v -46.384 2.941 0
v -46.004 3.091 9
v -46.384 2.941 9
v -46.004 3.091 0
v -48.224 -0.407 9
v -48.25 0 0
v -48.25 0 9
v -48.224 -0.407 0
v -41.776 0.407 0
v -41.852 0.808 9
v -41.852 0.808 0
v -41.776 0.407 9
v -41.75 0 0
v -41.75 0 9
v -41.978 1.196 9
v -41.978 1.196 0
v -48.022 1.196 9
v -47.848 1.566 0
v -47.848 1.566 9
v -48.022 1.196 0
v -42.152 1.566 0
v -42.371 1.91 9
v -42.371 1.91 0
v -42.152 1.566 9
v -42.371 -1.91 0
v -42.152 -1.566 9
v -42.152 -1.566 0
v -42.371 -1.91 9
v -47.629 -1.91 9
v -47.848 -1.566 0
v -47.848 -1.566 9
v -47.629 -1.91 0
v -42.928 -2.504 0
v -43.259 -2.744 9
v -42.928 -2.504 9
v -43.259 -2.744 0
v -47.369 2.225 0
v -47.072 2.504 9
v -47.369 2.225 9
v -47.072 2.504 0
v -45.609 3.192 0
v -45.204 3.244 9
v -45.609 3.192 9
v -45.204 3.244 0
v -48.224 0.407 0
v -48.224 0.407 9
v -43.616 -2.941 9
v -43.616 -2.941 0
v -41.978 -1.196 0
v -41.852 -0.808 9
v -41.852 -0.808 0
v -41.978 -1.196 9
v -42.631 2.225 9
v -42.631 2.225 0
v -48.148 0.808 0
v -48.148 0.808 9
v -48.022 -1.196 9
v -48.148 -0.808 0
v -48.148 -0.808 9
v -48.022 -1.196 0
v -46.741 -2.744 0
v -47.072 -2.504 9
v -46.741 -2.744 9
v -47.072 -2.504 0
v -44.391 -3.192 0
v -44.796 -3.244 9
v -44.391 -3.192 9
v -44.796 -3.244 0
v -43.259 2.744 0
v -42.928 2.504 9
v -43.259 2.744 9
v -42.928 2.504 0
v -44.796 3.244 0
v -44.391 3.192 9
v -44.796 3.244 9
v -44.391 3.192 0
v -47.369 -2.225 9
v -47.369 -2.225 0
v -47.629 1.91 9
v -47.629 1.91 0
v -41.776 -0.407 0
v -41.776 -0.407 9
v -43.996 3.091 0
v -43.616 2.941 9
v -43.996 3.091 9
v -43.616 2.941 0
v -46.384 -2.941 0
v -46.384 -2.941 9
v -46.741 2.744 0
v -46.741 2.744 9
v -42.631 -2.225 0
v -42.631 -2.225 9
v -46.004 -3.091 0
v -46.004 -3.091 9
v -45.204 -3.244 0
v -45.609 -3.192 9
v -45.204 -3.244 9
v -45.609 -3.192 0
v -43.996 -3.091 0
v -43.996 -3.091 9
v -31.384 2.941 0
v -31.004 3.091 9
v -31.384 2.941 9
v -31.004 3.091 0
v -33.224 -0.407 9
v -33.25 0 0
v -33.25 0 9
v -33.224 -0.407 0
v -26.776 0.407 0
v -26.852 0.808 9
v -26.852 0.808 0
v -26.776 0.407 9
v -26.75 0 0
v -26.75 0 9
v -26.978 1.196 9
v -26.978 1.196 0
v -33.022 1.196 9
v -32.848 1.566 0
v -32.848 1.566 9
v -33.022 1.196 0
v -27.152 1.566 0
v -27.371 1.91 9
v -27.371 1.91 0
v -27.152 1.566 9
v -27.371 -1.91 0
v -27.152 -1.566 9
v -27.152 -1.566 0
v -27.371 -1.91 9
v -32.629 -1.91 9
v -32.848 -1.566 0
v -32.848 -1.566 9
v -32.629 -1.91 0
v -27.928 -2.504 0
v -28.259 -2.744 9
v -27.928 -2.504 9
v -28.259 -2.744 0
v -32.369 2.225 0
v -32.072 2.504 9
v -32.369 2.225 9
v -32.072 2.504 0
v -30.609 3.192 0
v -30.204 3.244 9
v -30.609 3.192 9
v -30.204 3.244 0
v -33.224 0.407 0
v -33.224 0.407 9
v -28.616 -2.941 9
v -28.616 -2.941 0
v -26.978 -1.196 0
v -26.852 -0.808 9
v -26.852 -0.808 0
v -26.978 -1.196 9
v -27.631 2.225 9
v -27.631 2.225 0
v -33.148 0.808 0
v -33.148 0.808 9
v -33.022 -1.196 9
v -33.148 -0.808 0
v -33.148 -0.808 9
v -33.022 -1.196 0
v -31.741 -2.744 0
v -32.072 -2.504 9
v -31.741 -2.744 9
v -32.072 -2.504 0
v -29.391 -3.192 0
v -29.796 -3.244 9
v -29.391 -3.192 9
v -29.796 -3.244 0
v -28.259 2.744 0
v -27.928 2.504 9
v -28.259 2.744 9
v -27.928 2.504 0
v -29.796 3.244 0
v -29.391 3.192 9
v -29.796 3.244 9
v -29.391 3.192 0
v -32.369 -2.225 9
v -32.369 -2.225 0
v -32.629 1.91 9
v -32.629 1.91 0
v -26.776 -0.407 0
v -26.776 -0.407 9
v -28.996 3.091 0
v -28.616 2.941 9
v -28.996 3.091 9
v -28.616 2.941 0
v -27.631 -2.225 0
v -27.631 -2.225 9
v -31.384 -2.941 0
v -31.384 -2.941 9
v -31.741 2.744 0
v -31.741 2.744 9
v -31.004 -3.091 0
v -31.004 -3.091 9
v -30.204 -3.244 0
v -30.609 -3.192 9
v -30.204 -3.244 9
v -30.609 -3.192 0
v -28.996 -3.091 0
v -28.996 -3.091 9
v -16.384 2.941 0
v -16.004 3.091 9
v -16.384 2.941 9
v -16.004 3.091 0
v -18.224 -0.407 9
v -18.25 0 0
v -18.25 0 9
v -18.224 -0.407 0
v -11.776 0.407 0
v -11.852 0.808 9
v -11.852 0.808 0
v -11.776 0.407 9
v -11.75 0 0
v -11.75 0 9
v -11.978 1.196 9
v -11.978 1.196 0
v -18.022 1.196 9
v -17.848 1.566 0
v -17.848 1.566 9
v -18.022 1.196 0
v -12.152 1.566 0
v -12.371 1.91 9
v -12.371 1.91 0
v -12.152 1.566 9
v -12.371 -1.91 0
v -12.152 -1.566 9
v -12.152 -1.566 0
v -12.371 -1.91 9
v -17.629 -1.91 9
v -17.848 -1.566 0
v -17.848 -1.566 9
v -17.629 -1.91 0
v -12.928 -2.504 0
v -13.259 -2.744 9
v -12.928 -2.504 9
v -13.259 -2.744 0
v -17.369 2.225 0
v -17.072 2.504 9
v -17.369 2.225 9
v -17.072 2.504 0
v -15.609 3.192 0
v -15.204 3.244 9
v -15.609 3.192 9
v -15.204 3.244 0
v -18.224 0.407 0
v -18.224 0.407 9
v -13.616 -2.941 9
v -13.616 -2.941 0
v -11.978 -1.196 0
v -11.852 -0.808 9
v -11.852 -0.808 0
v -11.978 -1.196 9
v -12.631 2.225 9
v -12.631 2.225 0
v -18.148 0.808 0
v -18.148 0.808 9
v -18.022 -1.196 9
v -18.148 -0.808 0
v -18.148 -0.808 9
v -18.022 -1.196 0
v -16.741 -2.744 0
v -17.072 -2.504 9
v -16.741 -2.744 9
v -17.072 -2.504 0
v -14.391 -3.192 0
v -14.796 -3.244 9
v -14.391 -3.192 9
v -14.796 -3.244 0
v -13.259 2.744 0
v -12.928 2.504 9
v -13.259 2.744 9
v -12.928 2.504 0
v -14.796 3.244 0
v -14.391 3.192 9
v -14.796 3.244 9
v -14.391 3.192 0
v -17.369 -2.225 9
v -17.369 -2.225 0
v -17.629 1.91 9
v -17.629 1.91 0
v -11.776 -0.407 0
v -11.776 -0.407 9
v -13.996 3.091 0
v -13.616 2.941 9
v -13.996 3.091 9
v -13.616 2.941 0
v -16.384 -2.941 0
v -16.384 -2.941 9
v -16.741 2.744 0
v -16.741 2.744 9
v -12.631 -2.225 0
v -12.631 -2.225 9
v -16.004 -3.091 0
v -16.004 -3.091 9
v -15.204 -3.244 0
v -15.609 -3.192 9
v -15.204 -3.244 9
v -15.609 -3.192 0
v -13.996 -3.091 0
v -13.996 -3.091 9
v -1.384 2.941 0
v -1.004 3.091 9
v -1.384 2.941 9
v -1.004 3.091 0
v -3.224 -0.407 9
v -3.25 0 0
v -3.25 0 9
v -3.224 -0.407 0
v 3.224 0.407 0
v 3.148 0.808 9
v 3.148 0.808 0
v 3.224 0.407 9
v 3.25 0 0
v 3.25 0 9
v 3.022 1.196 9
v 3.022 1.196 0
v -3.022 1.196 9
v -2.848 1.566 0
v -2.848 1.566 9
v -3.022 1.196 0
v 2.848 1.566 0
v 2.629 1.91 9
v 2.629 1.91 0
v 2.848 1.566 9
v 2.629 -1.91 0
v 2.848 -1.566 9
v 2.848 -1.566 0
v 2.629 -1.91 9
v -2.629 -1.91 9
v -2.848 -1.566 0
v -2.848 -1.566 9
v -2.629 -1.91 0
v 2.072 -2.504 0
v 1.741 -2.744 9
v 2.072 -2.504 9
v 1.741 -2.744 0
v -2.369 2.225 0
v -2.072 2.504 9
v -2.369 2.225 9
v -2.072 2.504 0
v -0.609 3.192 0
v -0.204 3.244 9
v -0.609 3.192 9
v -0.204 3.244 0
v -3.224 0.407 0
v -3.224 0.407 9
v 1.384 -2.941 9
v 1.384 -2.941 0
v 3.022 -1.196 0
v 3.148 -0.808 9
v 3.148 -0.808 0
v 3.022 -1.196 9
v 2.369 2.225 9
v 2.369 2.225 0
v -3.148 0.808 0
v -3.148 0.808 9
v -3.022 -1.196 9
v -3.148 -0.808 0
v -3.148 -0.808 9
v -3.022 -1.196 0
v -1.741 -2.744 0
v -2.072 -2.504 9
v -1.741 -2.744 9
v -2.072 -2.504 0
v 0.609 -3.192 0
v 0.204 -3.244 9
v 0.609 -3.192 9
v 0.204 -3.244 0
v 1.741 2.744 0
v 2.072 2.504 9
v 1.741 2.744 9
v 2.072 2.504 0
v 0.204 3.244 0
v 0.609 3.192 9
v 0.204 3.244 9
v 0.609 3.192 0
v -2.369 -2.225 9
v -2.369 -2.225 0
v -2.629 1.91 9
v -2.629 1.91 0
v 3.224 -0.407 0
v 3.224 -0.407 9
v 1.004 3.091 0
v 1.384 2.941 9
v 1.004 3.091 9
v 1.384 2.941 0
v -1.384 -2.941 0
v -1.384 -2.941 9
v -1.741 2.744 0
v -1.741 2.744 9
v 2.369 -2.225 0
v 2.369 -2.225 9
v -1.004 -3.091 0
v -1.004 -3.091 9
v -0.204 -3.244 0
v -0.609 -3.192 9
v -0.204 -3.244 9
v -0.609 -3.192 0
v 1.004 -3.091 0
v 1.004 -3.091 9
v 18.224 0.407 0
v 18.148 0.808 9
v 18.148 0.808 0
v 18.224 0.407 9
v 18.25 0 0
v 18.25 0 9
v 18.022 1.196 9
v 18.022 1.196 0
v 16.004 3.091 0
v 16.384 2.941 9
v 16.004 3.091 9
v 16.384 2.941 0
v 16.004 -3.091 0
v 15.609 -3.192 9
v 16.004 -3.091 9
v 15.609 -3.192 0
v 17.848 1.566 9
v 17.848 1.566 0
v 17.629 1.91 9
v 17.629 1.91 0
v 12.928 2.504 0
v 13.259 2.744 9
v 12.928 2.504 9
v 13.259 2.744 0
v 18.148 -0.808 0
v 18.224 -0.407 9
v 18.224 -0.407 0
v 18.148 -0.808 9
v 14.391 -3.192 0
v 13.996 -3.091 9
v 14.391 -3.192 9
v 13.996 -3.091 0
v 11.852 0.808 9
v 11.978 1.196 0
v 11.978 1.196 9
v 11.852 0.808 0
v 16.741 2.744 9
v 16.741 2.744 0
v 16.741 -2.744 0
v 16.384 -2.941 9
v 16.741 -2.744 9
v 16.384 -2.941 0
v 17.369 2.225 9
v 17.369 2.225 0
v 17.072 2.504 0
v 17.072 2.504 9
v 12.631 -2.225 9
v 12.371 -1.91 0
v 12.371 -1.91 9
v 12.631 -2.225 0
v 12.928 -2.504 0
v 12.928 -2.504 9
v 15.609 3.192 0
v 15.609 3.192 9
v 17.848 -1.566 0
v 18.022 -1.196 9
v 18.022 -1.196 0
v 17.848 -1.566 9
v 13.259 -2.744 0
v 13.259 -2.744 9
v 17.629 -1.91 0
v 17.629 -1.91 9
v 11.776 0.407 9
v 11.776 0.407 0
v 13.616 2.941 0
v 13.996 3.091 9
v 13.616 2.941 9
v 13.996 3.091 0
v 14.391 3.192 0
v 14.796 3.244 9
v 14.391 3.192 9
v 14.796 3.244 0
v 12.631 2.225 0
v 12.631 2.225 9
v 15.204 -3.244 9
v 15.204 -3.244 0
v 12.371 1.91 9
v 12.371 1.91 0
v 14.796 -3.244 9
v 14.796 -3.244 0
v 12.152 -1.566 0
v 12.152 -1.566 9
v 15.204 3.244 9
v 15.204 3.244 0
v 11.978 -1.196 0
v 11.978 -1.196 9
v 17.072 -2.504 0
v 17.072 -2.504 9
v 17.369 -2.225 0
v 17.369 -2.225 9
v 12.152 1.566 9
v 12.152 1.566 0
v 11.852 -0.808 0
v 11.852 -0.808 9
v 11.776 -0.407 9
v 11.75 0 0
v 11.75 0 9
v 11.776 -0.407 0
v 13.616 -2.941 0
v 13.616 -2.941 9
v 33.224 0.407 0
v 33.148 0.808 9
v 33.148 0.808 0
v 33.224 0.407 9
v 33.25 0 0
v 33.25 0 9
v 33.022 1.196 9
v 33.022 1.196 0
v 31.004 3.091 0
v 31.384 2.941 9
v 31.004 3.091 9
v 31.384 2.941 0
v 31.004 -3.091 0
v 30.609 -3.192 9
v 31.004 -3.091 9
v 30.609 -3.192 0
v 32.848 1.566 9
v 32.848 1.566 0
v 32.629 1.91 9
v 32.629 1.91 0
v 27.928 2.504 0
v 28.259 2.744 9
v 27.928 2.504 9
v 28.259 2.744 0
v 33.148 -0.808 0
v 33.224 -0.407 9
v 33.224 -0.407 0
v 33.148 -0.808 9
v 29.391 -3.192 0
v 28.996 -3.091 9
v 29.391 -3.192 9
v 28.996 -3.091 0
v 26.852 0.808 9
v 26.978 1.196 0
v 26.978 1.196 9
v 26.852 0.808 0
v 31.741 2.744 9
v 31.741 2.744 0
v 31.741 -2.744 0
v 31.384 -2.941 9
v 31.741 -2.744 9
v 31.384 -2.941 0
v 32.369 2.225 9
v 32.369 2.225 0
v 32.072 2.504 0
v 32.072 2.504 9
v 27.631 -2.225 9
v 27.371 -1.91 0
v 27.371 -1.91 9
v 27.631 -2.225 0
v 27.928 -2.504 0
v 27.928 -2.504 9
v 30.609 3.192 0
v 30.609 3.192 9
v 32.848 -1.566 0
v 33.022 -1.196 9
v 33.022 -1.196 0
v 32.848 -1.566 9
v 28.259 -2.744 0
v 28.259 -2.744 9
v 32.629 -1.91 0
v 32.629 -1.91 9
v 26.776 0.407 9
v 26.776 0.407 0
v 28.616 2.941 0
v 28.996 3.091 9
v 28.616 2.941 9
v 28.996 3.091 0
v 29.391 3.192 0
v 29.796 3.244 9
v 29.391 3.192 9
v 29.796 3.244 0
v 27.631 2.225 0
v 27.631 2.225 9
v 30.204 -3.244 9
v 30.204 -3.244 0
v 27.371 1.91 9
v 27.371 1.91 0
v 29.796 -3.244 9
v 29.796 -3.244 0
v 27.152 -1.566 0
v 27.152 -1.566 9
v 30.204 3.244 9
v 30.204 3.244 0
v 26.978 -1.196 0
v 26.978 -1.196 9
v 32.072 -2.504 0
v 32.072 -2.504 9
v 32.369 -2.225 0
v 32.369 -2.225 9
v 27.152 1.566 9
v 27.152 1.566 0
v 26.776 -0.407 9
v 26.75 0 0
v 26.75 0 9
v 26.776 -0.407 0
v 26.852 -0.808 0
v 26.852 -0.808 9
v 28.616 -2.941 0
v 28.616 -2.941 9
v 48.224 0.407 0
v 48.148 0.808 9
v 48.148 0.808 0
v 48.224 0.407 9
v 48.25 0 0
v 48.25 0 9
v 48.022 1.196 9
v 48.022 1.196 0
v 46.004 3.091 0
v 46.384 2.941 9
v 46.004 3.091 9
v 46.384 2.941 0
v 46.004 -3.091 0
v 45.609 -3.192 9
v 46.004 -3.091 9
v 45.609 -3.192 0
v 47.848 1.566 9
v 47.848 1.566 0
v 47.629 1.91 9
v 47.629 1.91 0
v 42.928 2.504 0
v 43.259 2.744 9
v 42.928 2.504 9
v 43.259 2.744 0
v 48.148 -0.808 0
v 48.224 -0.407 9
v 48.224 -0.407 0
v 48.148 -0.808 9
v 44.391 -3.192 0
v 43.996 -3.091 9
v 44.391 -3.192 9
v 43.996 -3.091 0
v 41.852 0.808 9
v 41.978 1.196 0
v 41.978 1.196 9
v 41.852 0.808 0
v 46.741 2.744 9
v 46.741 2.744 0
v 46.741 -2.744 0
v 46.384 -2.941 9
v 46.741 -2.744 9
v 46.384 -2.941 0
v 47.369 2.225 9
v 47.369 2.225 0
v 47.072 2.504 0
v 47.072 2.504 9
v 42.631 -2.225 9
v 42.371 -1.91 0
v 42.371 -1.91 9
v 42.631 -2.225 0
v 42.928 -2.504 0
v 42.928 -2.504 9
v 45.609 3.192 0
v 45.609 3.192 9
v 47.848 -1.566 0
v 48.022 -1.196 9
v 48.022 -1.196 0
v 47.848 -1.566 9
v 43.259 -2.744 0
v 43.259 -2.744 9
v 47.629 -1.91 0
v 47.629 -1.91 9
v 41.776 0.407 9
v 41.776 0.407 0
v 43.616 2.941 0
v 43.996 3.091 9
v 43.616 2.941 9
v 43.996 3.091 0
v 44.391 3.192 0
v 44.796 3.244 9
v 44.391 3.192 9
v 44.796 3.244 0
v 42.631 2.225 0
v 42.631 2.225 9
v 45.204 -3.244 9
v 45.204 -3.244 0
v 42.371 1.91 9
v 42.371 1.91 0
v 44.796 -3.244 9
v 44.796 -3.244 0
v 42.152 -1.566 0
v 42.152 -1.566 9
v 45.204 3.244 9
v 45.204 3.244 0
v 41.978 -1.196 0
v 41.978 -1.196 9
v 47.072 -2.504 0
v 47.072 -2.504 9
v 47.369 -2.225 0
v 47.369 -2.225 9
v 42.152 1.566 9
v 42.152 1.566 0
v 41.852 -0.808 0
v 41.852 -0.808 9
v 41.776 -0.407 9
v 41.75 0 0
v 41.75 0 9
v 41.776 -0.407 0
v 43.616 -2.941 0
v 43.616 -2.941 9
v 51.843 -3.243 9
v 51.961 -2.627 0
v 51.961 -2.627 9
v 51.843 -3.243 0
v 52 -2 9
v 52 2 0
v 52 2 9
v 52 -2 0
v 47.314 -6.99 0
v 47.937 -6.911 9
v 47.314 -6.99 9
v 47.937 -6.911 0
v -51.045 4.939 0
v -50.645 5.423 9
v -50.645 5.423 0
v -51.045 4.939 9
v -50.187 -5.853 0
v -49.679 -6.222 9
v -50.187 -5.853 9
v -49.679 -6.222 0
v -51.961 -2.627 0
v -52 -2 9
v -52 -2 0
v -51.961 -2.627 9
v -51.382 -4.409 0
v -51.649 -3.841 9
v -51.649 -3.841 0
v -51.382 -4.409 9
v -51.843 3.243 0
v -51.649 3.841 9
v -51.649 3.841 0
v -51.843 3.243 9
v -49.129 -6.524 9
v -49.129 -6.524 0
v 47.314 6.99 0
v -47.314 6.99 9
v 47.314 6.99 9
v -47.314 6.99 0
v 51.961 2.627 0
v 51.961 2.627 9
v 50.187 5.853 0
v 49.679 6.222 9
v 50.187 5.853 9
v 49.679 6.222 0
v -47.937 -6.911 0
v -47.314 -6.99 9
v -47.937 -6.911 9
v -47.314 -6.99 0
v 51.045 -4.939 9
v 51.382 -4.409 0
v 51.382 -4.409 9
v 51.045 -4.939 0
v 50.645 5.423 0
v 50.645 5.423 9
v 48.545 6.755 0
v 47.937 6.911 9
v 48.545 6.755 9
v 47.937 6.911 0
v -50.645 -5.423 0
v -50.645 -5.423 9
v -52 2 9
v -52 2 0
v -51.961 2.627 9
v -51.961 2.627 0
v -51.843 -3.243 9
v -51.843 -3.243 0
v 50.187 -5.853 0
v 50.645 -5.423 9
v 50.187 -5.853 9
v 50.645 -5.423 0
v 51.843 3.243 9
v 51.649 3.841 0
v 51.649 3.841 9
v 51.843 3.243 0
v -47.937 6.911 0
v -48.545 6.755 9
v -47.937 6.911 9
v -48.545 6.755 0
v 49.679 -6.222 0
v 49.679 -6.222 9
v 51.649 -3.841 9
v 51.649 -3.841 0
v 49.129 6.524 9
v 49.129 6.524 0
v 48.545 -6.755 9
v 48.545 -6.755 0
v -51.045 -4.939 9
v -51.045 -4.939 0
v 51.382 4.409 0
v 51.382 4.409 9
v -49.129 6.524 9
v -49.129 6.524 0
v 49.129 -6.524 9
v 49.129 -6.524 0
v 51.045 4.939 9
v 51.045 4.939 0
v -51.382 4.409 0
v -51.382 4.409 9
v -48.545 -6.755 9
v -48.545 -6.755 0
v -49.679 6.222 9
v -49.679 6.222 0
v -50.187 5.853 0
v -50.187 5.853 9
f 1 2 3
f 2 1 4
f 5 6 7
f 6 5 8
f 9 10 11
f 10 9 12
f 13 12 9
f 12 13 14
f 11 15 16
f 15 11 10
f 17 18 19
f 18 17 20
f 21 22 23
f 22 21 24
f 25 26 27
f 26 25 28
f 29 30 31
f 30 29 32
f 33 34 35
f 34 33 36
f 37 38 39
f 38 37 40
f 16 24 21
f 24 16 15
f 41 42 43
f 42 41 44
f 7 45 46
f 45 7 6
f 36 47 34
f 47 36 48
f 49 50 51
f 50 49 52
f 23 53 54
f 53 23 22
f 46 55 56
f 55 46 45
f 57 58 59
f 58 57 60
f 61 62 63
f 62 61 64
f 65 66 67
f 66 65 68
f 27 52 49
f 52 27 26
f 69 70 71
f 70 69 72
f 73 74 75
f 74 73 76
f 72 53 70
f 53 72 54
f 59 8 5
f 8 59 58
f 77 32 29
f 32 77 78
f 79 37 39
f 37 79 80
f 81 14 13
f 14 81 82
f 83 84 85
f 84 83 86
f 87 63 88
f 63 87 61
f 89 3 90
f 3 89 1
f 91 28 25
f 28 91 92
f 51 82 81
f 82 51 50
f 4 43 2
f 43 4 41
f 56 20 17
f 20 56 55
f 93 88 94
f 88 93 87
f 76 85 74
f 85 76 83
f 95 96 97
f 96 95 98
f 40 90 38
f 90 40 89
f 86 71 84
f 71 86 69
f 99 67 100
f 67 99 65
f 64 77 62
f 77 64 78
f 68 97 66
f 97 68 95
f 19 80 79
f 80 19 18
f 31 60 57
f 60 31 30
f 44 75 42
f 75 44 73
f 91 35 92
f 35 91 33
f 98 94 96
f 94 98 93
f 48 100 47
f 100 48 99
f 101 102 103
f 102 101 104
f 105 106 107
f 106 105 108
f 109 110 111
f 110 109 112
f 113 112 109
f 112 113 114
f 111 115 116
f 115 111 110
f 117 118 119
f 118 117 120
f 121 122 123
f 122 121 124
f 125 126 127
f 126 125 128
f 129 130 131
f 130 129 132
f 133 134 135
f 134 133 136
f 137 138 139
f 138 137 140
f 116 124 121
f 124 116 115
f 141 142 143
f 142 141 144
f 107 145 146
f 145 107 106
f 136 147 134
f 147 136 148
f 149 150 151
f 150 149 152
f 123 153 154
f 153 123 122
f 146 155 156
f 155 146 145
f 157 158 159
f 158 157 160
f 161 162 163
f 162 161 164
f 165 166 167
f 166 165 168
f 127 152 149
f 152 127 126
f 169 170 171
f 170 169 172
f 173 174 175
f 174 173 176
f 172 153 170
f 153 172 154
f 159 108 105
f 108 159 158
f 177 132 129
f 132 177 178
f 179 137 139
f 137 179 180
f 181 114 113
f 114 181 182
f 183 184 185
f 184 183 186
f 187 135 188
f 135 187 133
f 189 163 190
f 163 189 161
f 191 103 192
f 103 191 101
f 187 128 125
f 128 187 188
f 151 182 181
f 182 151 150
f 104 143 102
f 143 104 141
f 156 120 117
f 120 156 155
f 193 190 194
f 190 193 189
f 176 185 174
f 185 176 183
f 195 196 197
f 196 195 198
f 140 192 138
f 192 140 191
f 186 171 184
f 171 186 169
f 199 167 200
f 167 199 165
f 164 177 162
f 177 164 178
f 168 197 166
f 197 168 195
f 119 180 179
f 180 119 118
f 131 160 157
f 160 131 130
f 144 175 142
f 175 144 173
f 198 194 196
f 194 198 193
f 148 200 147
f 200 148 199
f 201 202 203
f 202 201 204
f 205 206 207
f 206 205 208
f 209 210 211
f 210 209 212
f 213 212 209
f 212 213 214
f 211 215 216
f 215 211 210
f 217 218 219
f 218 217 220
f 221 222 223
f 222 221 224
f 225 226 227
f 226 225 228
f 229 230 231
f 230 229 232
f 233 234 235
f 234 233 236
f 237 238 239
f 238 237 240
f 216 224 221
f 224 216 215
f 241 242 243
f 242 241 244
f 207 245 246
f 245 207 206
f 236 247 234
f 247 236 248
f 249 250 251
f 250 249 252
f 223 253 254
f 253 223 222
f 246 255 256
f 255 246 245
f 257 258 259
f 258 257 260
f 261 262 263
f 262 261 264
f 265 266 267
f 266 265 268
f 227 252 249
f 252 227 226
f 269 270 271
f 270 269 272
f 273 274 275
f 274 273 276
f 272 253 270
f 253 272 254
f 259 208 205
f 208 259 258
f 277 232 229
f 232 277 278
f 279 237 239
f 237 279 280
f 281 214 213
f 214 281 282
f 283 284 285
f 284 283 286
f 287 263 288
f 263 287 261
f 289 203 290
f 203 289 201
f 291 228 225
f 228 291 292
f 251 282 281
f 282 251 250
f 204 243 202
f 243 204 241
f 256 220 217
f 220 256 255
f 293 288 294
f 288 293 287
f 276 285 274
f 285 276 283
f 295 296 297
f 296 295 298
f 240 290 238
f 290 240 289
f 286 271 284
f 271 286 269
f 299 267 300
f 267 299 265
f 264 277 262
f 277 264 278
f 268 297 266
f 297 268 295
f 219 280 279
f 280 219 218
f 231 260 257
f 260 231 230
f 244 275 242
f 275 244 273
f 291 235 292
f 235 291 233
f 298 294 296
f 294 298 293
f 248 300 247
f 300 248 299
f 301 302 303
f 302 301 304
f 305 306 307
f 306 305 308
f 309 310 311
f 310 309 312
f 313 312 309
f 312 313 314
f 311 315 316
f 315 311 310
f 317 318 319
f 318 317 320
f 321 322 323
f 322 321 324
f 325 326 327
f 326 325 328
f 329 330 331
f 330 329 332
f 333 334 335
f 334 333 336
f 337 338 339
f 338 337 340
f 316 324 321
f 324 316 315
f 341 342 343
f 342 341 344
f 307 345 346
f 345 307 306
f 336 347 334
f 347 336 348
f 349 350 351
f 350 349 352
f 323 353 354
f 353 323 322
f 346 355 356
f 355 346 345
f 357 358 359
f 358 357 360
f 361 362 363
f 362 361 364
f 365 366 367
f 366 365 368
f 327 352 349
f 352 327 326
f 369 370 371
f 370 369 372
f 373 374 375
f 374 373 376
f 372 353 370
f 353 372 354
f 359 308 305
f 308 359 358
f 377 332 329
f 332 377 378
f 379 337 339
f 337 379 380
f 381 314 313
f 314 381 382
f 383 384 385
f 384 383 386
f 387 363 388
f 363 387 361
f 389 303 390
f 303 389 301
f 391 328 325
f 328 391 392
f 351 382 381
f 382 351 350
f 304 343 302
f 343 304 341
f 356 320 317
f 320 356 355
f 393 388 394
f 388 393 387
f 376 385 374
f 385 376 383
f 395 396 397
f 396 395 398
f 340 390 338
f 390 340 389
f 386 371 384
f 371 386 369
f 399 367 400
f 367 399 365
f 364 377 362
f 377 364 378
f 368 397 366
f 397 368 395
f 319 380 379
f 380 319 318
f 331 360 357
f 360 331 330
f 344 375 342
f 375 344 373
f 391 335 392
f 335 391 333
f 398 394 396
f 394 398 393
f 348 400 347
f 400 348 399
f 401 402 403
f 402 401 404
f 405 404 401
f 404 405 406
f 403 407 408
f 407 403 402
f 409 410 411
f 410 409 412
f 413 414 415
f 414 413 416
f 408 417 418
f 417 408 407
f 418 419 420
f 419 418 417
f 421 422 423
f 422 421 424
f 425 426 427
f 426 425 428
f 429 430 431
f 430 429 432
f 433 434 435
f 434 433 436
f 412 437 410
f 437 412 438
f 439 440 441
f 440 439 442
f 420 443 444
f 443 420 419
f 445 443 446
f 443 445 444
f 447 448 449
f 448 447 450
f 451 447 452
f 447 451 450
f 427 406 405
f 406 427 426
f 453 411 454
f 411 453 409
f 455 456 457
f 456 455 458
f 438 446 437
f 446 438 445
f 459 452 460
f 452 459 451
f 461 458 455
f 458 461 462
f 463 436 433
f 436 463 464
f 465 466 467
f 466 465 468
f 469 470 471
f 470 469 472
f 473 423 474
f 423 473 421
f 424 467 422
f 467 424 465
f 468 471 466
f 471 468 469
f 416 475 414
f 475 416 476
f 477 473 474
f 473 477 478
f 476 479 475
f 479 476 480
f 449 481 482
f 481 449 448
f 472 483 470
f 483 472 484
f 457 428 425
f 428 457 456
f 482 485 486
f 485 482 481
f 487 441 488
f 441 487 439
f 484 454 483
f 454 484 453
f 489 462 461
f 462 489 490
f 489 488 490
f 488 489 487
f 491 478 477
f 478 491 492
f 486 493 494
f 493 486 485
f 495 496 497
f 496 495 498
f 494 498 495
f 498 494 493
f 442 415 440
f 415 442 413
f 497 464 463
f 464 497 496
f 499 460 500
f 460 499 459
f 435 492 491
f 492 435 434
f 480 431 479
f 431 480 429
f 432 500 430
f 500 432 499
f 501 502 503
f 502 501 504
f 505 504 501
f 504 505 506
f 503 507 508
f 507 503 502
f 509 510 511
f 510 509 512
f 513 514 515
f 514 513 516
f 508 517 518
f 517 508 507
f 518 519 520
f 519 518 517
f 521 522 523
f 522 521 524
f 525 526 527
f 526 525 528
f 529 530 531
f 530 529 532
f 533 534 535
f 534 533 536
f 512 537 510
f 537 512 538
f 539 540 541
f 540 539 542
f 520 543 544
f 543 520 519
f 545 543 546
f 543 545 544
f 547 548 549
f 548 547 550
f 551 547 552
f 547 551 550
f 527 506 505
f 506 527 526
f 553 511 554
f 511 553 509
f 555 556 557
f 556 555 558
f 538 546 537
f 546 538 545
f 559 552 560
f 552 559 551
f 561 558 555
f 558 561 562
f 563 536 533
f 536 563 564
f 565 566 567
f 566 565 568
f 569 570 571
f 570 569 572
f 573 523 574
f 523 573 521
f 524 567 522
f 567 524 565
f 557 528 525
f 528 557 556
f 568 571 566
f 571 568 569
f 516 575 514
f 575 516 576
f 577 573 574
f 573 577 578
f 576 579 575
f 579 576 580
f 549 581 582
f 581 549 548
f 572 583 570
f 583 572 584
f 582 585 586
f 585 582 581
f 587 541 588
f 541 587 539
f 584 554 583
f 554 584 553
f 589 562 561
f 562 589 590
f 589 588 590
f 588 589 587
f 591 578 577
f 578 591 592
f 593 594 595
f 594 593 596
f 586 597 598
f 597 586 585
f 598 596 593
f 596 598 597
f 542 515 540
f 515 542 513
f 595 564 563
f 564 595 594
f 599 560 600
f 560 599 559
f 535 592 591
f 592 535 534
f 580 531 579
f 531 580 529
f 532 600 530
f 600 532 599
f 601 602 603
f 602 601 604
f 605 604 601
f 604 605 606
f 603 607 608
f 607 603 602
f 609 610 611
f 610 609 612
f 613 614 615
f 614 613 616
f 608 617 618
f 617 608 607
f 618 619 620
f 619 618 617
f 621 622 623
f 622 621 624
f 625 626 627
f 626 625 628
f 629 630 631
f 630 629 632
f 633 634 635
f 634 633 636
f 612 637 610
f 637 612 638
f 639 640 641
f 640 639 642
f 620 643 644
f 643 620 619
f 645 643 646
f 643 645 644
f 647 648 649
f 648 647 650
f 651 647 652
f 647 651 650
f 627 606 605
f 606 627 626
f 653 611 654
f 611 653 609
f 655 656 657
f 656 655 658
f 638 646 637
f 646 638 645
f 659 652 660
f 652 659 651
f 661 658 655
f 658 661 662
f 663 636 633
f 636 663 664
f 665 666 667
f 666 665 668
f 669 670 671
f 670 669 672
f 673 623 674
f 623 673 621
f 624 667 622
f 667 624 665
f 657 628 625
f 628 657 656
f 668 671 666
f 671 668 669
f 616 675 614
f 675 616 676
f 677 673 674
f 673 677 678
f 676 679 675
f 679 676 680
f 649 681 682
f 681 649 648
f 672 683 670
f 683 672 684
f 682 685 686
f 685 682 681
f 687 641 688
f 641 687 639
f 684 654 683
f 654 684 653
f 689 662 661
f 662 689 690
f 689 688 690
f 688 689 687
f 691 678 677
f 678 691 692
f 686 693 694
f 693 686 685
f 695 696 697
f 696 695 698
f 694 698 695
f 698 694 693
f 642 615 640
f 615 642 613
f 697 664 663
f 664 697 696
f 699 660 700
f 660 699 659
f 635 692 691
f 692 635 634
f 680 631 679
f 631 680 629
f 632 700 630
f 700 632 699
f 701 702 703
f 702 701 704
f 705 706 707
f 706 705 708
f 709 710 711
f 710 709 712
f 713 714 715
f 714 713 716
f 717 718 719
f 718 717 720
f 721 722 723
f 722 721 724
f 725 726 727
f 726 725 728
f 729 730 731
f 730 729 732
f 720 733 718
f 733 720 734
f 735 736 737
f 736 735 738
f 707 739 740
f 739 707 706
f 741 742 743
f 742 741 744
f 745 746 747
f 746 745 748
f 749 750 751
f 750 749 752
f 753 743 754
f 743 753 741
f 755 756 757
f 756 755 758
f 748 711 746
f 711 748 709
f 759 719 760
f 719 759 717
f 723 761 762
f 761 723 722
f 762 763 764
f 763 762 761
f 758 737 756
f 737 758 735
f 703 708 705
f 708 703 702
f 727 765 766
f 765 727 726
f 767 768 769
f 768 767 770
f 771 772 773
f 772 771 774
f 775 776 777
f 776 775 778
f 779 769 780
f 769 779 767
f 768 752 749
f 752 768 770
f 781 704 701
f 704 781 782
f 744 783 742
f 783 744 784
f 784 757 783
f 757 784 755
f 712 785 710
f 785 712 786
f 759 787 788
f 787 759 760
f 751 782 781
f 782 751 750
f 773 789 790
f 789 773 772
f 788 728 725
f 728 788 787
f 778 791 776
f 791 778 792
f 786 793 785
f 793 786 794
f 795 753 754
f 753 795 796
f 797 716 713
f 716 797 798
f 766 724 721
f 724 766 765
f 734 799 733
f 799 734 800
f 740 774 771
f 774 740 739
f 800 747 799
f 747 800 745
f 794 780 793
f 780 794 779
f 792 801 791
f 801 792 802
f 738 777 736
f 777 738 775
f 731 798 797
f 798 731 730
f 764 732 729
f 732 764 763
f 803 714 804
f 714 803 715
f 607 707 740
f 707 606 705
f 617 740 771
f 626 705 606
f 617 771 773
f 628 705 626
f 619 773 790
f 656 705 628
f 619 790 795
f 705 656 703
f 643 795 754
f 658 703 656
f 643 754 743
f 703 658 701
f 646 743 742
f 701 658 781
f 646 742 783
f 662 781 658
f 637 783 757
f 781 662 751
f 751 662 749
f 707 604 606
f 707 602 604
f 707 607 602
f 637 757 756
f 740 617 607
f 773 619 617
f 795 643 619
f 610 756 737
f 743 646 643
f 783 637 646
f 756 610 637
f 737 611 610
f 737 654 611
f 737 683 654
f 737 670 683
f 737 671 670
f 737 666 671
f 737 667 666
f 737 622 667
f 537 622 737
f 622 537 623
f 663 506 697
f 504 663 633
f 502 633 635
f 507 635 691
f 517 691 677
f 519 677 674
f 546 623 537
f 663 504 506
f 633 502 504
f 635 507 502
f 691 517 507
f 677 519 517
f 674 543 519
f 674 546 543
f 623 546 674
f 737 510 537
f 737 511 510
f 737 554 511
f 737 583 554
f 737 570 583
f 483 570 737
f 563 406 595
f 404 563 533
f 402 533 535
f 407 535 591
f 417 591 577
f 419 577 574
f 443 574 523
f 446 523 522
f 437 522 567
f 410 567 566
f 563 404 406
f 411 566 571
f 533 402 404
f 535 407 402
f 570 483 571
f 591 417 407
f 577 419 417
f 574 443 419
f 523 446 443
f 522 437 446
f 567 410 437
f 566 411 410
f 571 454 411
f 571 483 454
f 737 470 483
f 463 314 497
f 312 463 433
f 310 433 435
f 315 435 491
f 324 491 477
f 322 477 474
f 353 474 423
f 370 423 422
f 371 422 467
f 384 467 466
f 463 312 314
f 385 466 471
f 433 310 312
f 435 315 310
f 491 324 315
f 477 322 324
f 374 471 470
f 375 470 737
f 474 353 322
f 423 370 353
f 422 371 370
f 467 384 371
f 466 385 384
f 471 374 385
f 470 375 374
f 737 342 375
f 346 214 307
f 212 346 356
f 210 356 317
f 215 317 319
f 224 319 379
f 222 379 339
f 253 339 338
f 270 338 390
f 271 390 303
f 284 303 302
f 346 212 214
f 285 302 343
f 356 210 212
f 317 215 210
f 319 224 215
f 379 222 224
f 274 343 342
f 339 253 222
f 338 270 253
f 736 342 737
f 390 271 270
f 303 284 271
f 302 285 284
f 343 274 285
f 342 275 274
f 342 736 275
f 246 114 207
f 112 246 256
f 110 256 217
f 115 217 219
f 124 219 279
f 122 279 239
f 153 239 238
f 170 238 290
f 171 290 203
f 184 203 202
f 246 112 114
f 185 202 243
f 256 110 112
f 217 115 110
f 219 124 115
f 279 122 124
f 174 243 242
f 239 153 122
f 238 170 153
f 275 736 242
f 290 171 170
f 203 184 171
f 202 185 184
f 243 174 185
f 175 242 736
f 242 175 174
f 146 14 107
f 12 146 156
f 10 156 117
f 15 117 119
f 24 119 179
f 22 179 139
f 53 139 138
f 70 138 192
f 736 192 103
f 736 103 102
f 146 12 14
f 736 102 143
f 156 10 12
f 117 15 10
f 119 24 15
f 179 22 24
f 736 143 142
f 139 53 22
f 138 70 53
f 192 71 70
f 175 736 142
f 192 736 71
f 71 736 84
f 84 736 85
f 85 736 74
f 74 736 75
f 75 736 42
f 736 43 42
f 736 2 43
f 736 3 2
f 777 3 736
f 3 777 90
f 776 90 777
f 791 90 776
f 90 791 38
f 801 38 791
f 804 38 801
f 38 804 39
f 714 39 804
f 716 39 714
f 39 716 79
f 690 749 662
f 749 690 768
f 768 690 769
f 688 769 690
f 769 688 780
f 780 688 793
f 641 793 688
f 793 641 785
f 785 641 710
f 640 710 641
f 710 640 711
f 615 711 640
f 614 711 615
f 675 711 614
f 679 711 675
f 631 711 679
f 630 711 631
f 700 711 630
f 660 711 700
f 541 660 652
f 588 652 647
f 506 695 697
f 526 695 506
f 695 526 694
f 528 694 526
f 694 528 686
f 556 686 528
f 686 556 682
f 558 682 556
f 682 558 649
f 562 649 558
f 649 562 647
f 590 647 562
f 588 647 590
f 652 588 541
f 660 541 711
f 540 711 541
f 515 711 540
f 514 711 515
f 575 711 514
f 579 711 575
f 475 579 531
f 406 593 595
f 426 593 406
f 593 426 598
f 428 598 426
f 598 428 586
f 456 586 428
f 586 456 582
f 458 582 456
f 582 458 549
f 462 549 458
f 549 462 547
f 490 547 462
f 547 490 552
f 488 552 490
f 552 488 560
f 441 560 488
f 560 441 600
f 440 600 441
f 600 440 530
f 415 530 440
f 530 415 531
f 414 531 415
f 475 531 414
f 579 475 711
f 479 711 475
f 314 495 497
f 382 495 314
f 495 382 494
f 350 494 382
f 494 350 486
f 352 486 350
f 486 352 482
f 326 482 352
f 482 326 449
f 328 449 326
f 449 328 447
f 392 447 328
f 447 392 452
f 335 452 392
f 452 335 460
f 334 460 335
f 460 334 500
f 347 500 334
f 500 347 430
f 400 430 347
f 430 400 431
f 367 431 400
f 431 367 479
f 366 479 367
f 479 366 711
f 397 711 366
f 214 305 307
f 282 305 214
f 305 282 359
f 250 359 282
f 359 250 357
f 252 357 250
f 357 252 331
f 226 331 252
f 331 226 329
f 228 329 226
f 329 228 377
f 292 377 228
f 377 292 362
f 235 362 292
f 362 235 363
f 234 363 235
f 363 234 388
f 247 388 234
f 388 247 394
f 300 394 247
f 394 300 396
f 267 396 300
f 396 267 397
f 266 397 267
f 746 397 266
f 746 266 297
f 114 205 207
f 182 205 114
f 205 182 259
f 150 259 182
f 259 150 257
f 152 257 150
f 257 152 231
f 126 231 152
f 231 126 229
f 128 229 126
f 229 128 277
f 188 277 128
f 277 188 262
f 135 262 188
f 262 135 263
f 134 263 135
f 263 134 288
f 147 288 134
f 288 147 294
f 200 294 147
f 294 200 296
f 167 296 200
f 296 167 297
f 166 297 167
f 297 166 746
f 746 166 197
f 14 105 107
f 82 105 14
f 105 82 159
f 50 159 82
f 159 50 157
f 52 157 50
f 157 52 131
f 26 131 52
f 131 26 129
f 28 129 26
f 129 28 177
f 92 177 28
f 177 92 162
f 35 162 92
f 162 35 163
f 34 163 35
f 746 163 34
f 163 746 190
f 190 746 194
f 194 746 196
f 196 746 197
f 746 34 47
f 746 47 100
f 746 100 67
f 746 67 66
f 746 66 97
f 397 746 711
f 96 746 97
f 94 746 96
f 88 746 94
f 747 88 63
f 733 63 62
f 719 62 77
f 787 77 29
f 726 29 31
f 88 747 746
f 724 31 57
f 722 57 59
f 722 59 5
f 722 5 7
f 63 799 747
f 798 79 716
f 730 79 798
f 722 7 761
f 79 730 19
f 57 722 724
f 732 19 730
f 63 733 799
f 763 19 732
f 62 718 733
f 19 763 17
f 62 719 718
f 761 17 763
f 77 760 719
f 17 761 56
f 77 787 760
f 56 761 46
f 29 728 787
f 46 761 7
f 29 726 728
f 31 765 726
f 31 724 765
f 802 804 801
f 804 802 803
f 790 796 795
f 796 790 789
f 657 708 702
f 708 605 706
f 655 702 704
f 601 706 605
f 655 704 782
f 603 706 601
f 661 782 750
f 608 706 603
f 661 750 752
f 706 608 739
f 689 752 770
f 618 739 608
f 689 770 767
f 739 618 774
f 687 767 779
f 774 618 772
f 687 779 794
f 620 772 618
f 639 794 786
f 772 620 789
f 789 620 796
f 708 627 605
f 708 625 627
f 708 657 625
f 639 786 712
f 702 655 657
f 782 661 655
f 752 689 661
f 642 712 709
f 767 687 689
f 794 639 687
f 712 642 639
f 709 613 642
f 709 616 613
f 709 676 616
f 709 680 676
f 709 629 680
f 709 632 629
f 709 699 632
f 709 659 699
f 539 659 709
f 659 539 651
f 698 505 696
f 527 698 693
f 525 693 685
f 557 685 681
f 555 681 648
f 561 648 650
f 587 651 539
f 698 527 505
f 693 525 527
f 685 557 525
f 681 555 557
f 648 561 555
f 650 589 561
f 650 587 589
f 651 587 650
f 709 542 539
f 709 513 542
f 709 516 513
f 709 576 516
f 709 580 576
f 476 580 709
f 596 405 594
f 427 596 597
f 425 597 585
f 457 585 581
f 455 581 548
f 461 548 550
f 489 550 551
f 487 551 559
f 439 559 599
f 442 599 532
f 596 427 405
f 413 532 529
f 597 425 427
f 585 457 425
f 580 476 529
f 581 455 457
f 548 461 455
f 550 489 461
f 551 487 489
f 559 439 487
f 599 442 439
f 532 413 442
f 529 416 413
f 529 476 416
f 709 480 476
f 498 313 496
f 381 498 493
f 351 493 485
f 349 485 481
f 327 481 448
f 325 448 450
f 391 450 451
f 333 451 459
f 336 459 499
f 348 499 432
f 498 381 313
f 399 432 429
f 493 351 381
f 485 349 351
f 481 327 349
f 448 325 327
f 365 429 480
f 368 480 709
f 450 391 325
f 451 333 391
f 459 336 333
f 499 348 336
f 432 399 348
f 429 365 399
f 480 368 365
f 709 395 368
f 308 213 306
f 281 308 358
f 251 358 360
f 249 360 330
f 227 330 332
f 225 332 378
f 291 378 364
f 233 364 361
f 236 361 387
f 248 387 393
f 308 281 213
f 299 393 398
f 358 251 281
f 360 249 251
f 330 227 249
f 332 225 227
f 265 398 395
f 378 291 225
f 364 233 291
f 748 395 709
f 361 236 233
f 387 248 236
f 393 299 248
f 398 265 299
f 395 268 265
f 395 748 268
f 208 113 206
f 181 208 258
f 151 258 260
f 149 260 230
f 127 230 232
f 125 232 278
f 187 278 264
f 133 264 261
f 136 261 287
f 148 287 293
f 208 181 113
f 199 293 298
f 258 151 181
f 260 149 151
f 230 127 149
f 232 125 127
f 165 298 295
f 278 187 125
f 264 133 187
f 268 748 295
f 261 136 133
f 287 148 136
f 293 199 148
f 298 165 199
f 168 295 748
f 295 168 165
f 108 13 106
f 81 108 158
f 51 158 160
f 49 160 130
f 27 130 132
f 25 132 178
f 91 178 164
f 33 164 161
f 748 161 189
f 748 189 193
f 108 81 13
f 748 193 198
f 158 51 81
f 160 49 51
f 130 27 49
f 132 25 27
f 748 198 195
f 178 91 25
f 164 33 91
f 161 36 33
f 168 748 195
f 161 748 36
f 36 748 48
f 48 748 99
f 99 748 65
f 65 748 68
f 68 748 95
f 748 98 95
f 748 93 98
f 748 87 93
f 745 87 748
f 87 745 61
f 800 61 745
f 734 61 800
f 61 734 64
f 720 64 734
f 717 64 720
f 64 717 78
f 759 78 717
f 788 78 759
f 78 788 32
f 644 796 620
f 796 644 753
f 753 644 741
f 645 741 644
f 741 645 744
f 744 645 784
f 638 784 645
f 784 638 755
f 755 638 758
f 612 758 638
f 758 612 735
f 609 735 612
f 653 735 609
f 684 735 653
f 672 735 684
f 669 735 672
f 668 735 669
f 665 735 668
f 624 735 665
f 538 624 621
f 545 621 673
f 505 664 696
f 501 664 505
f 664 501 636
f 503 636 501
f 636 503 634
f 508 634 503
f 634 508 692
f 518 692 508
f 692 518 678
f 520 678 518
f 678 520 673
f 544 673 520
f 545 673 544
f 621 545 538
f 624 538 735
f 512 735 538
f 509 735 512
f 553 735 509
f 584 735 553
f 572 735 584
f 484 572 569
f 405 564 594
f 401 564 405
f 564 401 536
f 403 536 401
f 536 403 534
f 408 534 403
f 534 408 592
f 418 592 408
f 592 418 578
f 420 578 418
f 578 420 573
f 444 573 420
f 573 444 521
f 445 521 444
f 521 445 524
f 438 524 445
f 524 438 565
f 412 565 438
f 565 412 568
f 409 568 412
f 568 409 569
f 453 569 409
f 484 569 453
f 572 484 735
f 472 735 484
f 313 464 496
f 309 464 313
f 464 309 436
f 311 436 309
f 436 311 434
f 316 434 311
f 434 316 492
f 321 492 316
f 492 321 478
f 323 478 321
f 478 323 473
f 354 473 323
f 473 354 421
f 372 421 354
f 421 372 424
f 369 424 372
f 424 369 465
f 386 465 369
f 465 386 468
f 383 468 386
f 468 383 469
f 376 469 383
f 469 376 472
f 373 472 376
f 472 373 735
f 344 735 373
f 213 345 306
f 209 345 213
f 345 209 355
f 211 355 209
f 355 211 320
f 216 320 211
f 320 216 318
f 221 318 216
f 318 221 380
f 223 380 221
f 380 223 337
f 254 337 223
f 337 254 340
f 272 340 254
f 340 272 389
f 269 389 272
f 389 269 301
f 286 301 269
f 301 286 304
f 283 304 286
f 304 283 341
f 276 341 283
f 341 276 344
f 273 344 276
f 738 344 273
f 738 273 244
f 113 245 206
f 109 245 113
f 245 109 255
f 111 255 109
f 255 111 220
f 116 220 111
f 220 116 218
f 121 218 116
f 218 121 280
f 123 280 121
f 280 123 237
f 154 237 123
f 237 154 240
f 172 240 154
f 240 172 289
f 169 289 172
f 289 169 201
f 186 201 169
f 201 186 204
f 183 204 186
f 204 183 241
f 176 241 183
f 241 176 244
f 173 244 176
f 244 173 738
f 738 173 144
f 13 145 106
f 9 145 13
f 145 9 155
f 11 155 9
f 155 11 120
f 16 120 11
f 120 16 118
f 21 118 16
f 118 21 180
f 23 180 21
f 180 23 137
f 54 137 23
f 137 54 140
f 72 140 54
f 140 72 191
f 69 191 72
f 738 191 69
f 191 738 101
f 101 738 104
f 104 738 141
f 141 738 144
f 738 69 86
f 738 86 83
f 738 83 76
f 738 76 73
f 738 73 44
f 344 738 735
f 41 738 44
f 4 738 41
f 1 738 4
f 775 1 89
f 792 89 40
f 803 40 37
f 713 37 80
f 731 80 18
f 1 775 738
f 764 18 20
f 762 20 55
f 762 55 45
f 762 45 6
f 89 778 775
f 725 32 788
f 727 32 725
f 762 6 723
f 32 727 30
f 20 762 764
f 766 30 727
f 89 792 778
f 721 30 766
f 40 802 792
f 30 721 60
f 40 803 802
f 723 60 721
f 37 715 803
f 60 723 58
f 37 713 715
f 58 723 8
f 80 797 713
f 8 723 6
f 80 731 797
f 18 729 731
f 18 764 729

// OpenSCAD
$fn = 50;


difference() {
	union() {
		hull() {
			translate(v = [-47.0000000000, 2.0000000000, 0]) {
				cylinder(h = 9, r = 5);
			}
			translate(v = [47.0000000000, 2.0000000000, 0]) {
				cylinder(h = 9, r = 5);
			}
			translate(v = [-47.0000000000, -2.0000000000, 0]) {
				cylinder(h = 9, r = 5);
			}
			translate(v = [47.0000000000, -2.0000000000, 0]) {
				cylinder(h = 9, r = 5);
			}
		}
	}
	union() {
		translate(v = [-45.0000000000, 0.0000000000, -100.0000000000]) {
			cylinder(h = 200, r = 3.2500000000);
		}
		translate(v = [-30.0000000000, 0.0000000000, -100.0000000000]) {
			cylinder(h = 200, r = 3.2500000000);
		}
		translate(v = [-15.0000000000, 0.0000000000, -100.0000000000]) {
			cylinder(h = 200, r = 3.2500000000);
		}
		translate(v = [0.0000000000, 0.0000000000, -100.0000000000]) {
			cylinder(h = 200, r = 3.2500000000);
		}
		translate(v = [15.0000000000, 0.0000000000, -100.0000000000]) {
			cylinder(h = 200, r = 3.2500000000);
		}
		translate(v = [30.0000000000, 0.0000000000, -100.0000000000]) {
			cylinder(h = 200, r = 3.2500000000);
		}
		translate(v = [45.0000000000, 0.0000000000, -100.0000000000]) {
			cylinder(h = 200, r = 3.2500000000);
		}
	}
}
